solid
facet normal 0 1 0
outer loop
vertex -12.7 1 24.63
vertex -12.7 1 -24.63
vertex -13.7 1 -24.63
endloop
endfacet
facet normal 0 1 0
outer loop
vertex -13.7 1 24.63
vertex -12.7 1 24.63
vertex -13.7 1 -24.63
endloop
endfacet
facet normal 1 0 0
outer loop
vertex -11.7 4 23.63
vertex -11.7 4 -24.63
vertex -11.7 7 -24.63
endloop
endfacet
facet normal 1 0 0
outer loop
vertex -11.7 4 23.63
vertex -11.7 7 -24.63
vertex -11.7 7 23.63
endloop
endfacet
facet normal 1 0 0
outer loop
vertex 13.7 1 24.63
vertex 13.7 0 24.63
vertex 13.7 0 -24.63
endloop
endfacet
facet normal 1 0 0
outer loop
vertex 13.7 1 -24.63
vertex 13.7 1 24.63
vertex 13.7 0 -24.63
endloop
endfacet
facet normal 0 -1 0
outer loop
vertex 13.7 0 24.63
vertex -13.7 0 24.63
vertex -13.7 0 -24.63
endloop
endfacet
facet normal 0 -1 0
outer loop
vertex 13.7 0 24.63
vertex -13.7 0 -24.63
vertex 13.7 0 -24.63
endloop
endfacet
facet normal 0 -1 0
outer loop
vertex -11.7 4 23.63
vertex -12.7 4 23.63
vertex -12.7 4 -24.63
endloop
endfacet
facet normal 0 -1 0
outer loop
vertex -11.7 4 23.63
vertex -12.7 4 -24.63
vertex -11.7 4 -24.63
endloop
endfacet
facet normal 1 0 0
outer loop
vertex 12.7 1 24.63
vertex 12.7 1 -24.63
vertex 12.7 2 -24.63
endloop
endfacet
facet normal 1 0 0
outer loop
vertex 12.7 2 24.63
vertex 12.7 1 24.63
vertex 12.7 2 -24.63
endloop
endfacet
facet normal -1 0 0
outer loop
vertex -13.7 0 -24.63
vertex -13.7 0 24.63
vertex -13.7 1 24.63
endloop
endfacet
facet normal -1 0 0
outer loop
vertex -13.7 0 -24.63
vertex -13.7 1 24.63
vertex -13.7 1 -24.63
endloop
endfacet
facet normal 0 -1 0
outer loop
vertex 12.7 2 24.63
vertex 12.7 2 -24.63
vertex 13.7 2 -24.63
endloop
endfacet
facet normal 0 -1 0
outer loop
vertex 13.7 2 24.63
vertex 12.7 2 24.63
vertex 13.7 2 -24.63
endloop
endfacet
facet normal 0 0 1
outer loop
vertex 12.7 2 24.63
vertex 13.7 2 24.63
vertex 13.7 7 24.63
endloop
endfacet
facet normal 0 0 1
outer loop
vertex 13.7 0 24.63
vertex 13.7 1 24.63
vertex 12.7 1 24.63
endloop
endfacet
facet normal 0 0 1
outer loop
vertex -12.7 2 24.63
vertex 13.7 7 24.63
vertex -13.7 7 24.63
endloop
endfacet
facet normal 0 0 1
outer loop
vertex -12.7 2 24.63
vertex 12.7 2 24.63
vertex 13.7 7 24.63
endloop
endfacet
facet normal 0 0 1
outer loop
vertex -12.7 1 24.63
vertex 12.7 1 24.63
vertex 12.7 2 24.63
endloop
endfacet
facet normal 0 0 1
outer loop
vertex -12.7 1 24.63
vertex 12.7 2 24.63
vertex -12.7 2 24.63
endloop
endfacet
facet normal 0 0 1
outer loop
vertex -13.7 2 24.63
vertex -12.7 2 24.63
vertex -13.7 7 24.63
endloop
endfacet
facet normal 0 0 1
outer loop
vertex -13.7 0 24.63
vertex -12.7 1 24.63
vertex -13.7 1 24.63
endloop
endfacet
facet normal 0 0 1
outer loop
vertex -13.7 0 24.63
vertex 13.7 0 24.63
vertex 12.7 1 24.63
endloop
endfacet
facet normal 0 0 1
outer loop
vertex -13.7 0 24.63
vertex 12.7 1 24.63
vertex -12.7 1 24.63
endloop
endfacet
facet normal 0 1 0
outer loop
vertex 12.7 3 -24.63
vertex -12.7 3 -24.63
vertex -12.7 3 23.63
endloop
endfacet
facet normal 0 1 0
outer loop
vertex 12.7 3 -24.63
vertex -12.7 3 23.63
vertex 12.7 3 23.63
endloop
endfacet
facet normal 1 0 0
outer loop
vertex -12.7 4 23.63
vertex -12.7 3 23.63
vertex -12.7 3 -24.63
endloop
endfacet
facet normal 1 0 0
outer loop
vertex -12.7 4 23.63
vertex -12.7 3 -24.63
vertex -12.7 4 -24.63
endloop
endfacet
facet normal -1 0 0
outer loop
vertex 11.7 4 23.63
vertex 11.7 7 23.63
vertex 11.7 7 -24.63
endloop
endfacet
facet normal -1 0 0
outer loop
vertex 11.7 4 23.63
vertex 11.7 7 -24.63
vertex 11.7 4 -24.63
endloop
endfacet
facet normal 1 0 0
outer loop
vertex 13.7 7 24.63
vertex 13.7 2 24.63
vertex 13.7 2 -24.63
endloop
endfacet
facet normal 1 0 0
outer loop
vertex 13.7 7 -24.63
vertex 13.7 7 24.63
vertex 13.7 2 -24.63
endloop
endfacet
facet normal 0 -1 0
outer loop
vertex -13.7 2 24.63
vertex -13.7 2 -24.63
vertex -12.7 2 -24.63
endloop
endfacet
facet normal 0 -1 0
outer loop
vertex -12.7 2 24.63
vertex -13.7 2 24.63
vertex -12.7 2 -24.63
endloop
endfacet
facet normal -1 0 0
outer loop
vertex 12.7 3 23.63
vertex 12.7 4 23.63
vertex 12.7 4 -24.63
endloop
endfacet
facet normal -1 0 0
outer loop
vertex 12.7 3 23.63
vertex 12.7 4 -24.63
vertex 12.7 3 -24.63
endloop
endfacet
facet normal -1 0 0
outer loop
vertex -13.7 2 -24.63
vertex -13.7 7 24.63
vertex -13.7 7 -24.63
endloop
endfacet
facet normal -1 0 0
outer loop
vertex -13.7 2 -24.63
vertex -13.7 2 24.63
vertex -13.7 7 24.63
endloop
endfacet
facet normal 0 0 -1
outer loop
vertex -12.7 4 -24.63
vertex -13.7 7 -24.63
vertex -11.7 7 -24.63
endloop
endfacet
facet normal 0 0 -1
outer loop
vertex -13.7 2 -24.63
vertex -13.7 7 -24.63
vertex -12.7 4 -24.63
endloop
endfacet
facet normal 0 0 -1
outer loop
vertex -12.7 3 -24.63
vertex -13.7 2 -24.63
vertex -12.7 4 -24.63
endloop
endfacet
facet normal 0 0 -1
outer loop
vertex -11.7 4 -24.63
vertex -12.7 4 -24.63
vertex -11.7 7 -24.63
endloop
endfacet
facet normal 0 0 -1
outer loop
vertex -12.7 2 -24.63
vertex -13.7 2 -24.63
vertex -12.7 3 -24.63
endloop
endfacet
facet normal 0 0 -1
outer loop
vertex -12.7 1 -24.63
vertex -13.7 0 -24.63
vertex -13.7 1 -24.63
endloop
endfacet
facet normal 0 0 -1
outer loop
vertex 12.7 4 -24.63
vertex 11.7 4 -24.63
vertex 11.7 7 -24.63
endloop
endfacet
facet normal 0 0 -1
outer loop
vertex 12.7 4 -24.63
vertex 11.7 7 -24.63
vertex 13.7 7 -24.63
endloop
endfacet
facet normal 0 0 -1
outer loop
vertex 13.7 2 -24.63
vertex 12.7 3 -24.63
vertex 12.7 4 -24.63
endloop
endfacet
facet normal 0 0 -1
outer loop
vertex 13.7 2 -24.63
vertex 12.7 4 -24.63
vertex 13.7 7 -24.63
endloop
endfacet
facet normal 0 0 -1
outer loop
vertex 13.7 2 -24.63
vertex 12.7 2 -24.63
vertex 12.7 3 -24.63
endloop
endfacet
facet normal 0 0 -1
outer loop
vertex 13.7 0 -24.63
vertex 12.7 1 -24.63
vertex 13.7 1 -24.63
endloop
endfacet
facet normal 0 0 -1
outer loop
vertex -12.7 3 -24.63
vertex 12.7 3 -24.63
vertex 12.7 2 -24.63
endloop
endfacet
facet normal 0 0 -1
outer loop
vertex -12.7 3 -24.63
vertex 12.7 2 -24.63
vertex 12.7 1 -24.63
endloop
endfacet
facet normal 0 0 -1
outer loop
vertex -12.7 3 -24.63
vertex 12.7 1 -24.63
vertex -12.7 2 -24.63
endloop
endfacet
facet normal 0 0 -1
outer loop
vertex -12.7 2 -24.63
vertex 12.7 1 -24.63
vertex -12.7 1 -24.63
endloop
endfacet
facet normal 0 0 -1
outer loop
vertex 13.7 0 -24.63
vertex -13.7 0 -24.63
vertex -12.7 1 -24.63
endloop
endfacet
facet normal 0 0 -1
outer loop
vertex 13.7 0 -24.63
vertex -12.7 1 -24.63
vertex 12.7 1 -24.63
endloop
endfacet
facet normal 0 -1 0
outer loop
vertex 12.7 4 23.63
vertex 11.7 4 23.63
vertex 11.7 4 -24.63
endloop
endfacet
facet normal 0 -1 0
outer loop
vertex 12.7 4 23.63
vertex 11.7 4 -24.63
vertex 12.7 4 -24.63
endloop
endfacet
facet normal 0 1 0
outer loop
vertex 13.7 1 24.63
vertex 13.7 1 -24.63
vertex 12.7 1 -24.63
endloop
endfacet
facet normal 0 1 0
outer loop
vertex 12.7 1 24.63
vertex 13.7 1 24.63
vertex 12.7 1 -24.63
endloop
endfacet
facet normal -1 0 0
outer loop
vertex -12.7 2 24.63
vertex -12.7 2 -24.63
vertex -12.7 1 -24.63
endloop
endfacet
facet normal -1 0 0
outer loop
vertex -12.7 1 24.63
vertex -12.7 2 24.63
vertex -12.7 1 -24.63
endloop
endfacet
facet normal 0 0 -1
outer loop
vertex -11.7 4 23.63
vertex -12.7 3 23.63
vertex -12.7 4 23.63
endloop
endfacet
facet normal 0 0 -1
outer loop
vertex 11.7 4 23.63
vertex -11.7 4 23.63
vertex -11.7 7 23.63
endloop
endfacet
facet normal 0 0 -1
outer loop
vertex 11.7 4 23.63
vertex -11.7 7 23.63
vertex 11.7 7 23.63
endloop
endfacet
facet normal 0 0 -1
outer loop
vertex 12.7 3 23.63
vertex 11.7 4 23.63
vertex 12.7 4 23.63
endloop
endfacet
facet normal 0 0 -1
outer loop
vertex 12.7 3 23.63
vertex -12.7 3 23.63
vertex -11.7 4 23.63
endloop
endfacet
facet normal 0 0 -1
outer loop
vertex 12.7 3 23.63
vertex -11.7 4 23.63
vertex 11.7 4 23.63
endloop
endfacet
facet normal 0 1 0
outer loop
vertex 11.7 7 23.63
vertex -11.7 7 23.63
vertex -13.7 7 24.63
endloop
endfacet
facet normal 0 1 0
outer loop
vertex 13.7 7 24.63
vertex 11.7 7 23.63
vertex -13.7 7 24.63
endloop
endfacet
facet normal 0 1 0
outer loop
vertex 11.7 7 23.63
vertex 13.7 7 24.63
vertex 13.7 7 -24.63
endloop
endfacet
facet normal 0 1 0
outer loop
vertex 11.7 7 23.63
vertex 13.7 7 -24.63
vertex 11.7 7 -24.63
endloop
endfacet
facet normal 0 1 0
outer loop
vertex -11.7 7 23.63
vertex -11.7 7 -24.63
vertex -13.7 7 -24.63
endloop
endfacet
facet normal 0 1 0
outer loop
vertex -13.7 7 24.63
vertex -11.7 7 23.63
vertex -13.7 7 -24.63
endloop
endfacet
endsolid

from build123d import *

# Parameters (mm, degrees)
CROQUIS11_W             = 27.4
CROQUIS11_H             = 49.26
SALIENTE_EXTRUIR3_DEPTH = 3
CORTAR_EXTRUIR1_DEPTH   = 56
SALIENTE_EXTRUIR4_DEPTH = 49.26
CROQUIS24_W             = 25.4
CROQUIS24_H             = 1
SALIENTE_EXTRUIR6_DEPTH = 2
SALIENTE_EXTRUIR7_DEPTH = 2


with BuildPart() as part:
    # Croquis11 → Saliente-Extruir3 (new body)
    with BuildSketch(Plane(origin=(0, 0, 0), x_dir=(1, 0, 0), z_dir=(0, 1, 0))):
        Rectangle(CROQUIS11_W, CROQUIS11_H)
    extrude(amount=SALIENTE_EXTRUIR3_DEPTH)

    # Croquis21 → Cortar-Extruir1 (cut)
    with BuildSketch(Plane(origin=(0, 0, -24.63), x_dir=(-1, 0, 0), z_dir=(0, 0, -1))):
        Polygon((-12.7, 2), (-13.7, 2), (-13.7, 1.5), (-13.7, 1), (-12.7, 1), (-12.7, 1.5), align=None)
        Polygon((13.7, 2), (12.7, 2), (12.7, 1.5), (12.7, 1), (13.7, 1), (13.7, 1.5), align=None)
    extrude(amount=-CORTAR_EXTRUIR1_DEPTH, mode=Mode.SUBTRACT)

    # Croquis23 → Saliente-Extruir4 (add)
    with BuildSketch(Plane.XY.offset(24.63)):
        Polygon((-13.7, 5), (-13.7, 3), (-12.7, 3), (-12.7, 4), (-11.7, 4), (-11.7, 5), align=None)
        Polygon((12.7, 4), (12.7, 3), (13.7, 3), (13.7, 5), (11.7, 5), (11.7, 4), align=None)
    extrude(amount=-SALIENTE_EXTRUIR4_DEPTH)

    # Croquis24 → Saliente-Extruir6 (add)
    with BuildSketch(Plane(origin=(0, 3, 0), x_dir=(1, 0, 0), z_dir=(0, 1, 0))):
        with Locations((0, -24.13)):
            Rectangle(CROQUIS24_W, CROQUIS24_H)
    extrude(amount=SALIENTE_EXTRUIR6_DEPTH)

    # Croquis26 → Saliente-Extruir7 (add)
    with BuildSketch(Plane(origin=(0, 5, 0), x_dir=(1, 0, 0), z_dir=(0, 1, 0))):
        Polygon((-13.7, 24.63), (-11.7, 24.63), (-11.7, -23.63), (11.7, -23.63), (11.7, 24.63), (13.7, 24.63), (13.7, -24.63), (-13.7, -24.63), align=None)
    extrude(amount=SALIENTE_EXTRUIR7_DEPTH)


solid = part.part
